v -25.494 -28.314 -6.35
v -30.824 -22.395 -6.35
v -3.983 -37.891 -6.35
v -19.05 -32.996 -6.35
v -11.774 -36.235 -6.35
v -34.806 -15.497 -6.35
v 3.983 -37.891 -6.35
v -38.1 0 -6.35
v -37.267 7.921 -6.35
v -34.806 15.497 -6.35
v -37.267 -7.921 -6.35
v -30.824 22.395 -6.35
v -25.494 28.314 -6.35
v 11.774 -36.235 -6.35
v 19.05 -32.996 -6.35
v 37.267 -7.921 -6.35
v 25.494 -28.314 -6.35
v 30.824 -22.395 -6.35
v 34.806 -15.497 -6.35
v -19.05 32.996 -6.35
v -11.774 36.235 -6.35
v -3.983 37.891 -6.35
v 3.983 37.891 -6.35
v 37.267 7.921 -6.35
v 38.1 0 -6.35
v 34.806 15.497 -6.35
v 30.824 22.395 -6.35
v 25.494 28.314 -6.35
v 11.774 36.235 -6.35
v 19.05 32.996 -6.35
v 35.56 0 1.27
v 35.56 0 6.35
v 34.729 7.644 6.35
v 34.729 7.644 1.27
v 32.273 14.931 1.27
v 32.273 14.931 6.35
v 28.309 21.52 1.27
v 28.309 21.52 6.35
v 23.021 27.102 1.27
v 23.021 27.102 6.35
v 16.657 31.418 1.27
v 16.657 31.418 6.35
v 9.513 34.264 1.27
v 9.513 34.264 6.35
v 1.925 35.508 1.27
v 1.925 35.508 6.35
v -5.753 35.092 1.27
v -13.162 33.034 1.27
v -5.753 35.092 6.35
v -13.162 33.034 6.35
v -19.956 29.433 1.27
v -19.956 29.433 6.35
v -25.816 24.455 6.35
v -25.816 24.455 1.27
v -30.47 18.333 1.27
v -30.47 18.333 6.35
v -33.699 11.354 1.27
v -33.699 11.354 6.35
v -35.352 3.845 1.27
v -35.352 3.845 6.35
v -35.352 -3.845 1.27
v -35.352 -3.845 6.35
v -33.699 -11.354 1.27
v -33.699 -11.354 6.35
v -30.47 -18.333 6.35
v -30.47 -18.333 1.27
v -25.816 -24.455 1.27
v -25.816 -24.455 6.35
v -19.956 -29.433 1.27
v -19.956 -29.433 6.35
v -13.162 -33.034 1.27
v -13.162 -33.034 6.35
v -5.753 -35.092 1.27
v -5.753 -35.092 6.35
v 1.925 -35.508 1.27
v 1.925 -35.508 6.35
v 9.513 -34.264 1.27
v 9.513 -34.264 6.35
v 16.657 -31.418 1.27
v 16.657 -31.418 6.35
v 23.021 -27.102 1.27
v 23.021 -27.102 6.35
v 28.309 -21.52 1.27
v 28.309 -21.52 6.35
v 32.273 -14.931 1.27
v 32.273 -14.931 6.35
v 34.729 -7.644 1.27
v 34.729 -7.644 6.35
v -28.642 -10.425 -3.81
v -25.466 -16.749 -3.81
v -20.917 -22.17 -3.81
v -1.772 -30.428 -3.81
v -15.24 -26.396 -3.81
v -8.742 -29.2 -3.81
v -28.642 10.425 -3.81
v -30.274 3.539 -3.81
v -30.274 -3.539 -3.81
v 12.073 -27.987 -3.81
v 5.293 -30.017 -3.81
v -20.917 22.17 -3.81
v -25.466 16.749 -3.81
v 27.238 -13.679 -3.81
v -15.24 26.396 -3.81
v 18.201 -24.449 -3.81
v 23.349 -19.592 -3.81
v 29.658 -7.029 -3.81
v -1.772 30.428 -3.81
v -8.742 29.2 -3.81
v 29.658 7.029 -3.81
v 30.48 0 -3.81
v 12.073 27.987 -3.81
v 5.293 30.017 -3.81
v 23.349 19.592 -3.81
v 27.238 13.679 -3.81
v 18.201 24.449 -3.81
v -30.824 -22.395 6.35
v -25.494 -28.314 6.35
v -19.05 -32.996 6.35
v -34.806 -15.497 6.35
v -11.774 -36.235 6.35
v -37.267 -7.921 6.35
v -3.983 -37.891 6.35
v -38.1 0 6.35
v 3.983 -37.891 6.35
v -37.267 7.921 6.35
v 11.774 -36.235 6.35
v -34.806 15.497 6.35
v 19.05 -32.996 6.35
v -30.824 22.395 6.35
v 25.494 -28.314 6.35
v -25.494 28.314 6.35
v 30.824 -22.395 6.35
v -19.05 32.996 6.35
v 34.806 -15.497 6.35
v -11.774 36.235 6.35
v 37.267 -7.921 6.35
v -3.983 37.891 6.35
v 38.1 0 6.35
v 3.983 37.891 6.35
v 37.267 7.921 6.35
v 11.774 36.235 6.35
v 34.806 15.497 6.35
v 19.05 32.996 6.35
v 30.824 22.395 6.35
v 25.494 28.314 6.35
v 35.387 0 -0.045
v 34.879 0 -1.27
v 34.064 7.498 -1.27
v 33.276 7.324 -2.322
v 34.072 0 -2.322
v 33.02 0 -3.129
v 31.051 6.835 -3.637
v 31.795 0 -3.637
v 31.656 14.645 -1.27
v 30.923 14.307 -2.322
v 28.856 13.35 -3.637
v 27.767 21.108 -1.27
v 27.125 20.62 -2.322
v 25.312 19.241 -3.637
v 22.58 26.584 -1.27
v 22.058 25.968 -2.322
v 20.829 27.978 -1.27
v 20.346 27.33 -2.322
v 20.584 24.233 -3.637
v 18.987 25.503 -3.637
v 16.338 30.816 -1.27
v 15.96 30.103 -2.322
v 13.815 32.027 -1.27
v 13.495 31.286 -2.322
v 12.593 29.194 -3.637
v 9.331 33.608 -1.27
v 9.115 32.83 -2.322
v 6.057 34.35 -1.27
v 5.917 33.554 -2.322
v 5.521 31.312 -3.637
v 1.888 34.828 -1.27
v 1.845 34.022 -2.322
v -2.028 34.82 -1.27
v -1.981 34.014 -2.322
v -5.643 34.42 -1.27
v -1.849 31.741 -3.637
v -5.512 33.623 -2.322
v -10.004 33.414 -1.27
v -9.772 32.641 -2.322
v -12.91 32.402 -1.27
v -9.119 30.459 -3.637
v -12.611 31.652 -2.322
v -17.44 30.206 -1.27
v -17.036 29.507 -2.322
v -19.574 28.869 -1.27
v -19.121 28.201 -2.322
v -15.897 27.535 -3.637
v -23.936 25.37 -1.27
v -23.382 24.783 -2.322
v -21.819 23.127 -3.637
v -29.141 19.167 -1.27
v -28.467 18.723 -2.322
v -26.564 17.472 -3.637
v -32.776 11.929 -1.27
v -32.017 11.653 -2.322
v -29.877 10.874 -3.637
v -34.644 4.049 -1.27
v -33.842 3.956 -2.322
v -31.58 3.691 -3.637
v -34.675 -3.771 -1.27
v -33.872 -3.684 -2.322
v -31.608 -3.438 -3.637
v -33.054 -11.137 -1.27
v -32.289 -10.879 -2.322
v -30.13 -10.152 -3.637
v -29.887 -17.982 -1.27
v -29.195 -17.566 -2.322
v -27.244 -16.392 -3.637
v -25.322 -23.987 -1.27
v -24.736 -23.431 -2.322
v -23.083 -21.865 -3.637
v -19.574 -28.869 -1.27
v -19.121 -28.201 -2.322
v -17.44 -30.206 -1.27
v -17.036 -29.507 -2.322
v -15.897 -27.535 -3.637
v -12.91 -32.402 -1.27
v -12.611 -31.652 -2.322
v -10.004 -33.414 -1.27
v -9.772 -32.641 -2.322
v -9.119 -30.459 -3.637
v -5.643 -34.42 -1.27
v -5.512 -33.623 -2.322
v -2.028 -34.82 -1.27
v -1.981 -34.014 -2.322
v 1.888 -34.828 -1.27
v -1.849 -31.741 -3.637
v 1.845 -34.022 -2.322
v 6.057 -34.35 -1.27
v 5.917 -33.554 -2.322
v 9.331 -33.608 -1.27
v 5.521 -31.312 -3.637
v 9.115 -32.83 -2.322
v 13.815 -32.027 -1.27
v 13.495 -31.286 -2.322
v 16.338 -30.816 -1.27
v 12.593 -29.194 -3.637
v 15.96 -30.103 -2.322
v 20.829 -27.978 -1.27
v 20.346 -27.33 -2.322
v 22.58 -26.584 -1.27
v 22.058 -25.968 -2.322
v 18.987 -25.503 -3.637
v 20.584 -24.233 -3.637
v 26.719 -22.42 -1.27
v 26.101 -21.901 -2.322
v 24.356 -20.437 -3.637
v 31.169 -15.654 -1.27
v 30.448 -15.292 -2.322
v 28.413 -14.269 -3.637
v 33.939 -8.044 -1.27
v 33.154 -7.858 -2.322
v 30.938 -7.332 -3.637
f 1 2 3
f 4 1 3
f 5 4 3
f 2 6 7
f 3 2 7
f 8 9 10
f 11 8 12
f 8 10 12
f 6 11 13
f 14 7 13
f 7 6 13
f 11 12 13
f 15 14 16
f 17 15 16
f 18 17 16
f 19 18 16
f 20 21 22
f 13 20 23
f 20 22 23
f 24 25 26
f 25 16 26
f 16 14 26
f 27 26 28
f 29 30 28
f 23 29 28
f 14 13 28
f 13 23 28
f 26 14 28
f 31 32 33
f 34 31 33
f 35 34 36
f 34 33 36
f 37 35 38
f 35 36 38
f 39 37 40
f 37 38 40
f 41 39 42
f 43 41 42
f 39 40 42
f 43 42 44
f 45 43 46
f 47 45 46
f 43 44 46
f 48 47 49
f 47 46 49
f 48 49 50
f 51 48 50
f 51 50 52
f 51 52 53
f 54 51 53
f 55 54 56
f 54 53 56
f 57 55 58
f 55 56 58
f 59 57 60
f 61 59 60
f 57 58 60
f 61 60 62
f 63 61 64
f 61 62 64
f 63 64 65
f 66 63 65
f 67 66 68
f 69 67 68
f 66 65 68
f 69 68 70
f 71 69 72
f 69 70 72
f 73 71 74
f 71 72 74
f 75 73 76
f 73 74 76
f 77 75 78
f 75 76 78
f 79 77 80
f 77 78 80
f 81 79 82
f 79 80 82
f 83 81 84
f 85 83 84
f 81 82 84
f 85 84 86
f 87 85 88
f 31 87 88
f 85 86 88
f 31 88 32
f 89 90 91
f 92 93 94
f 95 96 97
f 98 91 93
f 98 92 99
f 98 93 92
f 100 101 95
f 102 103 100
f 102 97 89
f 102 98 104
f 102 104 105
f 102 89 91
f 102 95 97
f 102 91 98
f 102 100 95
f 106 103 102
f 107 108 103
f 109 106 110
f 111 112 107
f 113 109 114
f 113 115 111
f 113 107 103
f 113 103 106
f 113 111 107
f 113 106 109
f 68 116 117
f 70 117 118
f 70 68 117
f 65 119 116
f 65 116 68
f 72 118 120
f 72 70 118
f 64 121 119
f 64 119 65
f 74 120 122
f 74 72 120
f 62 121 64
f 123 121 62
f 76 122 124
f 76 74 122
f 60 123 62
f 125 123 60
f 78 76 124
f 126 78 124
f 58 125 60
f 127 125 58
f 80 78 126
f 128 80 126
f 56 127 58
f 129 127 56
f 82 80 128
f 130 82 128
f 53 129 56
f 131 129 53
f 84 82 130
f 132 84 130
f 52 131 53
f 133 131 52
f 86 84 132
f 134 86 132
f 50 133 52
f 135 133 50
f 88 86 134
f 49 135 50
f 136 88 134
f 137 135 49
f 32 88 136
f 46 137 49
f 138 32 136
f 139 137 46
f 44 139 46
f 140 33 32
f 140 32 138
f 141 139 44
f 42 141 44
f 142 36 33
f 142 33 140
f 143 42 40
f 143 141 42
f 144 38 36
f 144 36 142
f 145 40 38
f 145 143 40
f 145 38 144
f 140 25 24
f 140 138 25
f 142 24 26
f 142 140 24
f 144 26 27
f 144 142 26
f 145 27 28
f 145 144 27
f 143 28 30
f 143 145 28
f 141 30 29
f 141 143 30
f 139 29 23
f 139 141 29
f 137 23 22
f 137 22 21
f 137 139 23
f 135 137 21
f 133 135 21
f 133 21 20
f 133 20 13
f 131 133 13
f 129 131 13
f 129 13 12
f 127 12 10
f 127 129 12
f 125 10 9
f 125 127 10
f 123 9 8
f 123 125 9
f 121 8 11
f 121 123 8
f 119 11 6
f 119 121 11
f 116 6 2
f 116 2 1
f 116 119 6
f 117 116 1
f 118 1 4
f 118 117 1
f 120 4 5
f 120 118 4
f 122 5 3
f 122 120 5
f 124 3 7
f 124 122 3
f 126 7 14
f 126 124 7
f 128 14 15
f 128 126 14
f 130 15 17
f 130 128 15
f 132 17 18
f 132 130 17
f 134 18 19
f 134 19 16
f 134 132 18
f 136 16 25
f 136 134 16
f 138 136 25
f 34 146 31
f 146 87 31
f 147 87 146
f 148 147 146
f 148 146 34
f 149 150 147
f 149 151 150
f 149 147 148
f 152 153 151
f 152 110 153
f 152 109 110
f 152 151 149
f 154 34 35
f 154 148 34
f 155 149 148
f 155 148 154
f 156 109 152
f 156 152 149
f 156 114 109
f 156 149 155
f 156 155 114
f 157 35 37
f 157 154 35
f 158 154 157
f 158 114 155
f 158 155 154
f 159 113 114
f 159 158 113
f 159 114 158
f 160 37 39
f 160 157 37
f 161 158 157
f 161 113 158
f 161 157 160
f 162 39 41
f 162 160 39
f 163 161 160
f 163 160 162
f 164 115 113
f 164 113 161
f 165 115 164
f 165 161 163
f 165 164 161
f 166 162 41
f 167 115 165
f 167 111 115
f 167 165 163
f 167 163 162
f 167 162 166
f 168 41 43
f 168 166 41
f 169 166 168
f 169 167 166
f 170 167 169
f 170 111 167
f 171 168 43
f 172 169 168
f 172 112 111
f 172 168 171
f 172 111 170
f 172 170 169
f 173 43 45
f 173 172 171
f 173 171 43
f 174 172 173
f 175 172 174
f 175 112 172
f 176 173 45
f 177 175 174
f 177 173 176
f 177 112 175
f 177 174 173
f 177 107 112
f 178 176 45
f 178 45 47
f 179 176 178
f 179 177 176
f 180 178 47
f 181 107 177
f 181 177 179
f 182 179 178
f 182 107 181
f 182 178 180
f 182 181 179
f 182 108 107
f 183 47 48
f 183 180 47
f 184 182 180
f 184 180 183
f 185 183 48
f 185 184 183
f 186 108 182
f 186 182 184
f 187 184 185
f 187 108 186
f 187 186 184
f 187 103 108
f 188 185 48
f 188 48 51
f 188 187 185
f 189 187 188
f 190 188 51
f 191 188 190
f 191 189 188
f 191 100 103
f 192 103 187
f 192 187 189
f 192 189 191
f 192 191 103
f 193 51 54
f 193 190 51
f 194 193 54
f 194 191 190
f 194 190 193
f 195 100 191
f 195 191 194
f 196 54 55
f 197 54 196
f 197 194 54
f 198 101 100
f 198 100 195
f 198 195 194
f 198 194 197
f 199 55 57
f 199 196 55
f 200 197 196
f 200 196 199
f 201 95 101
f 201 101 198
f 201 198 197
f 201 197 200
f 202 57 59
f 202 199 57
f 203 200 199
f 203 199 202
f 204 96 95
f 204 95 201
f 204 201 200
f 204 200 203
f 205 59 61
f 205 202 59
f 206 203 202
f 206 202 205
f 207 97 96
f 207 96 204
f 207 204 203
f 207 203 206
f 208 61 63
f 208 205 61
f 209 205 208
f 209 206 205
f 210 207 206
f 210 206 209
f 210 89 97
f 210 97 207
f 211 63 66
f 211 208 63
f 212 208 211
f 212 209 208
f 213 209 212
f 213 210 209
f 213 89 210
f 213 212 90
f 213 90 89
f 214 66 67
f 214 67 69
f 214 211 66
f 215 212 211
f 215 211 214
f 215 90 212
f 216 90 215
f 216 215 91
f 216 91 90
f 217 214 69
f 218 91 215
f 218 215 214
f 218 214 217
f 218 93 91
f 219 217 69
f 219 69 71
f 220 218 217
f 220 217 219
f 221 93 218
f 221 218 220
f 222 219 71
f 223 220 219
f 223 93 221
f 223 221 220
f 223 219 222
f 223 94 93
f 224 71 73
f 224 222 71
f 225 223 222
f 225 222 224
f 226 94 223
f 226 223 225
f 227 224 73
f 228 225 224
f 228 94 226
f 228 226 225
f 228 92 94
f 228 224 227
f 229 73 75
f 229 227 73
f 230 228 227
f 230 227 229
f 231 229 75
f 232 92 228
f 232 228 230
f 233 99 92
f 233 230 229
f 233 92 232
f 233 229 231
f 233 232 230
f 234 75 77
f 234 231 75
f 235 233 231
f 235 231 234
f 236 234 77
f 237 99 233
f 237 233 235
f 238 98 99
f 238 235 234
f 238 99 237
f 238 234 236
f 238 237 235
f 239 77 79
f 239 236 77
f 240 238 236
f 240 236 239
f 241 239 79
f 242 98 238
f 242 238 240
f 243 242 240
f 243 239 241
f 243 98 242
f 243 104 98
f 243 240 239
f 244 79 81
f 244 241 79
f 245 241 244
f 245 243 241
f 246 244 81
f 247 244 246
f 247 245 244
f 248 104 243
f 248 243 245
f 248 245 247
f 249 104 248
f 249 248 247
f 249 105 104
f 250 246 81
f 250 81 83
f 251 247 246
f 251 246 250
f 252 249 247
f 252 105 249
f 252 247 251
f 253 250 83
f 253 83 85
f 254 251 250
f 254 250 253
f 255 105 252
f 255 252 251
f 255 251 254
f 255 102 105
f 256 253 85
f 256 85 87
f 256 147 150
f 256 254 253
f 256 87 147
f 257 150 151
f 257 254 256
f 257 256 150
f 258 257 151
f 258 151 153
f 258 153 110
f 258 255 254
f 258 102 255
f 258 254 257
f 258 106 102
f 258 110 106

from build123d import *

# Parameters (mm, degrees)
F0_R     = 38.1
F1_DEPTH = 6.35
F2_T     = -2.54
F3_R     = 5.08


with BuildPart() as f1:
    # F0 (on Top) → F1 (new body, symmetric)
    with BuildSketch(Plane.XY):
        Circle(F0_R)
    extrude(amount=F1_DEPTH, both=True)

    # F2
    f2_openings = [f1.faces().sort_by_distance(p)[0] for p in [
        (0, 0, 6.35),
    ]]
    offset(amount=F2_T, openings=f2_openings)

    # F3
    f3_edges = [f1.edges().sort_by_distance(p)[0] for p in [
        (-35.56, 0, -3.81),
    ]]
    fillet(f3_edges, radius=F3_R)


solid = f1.part
